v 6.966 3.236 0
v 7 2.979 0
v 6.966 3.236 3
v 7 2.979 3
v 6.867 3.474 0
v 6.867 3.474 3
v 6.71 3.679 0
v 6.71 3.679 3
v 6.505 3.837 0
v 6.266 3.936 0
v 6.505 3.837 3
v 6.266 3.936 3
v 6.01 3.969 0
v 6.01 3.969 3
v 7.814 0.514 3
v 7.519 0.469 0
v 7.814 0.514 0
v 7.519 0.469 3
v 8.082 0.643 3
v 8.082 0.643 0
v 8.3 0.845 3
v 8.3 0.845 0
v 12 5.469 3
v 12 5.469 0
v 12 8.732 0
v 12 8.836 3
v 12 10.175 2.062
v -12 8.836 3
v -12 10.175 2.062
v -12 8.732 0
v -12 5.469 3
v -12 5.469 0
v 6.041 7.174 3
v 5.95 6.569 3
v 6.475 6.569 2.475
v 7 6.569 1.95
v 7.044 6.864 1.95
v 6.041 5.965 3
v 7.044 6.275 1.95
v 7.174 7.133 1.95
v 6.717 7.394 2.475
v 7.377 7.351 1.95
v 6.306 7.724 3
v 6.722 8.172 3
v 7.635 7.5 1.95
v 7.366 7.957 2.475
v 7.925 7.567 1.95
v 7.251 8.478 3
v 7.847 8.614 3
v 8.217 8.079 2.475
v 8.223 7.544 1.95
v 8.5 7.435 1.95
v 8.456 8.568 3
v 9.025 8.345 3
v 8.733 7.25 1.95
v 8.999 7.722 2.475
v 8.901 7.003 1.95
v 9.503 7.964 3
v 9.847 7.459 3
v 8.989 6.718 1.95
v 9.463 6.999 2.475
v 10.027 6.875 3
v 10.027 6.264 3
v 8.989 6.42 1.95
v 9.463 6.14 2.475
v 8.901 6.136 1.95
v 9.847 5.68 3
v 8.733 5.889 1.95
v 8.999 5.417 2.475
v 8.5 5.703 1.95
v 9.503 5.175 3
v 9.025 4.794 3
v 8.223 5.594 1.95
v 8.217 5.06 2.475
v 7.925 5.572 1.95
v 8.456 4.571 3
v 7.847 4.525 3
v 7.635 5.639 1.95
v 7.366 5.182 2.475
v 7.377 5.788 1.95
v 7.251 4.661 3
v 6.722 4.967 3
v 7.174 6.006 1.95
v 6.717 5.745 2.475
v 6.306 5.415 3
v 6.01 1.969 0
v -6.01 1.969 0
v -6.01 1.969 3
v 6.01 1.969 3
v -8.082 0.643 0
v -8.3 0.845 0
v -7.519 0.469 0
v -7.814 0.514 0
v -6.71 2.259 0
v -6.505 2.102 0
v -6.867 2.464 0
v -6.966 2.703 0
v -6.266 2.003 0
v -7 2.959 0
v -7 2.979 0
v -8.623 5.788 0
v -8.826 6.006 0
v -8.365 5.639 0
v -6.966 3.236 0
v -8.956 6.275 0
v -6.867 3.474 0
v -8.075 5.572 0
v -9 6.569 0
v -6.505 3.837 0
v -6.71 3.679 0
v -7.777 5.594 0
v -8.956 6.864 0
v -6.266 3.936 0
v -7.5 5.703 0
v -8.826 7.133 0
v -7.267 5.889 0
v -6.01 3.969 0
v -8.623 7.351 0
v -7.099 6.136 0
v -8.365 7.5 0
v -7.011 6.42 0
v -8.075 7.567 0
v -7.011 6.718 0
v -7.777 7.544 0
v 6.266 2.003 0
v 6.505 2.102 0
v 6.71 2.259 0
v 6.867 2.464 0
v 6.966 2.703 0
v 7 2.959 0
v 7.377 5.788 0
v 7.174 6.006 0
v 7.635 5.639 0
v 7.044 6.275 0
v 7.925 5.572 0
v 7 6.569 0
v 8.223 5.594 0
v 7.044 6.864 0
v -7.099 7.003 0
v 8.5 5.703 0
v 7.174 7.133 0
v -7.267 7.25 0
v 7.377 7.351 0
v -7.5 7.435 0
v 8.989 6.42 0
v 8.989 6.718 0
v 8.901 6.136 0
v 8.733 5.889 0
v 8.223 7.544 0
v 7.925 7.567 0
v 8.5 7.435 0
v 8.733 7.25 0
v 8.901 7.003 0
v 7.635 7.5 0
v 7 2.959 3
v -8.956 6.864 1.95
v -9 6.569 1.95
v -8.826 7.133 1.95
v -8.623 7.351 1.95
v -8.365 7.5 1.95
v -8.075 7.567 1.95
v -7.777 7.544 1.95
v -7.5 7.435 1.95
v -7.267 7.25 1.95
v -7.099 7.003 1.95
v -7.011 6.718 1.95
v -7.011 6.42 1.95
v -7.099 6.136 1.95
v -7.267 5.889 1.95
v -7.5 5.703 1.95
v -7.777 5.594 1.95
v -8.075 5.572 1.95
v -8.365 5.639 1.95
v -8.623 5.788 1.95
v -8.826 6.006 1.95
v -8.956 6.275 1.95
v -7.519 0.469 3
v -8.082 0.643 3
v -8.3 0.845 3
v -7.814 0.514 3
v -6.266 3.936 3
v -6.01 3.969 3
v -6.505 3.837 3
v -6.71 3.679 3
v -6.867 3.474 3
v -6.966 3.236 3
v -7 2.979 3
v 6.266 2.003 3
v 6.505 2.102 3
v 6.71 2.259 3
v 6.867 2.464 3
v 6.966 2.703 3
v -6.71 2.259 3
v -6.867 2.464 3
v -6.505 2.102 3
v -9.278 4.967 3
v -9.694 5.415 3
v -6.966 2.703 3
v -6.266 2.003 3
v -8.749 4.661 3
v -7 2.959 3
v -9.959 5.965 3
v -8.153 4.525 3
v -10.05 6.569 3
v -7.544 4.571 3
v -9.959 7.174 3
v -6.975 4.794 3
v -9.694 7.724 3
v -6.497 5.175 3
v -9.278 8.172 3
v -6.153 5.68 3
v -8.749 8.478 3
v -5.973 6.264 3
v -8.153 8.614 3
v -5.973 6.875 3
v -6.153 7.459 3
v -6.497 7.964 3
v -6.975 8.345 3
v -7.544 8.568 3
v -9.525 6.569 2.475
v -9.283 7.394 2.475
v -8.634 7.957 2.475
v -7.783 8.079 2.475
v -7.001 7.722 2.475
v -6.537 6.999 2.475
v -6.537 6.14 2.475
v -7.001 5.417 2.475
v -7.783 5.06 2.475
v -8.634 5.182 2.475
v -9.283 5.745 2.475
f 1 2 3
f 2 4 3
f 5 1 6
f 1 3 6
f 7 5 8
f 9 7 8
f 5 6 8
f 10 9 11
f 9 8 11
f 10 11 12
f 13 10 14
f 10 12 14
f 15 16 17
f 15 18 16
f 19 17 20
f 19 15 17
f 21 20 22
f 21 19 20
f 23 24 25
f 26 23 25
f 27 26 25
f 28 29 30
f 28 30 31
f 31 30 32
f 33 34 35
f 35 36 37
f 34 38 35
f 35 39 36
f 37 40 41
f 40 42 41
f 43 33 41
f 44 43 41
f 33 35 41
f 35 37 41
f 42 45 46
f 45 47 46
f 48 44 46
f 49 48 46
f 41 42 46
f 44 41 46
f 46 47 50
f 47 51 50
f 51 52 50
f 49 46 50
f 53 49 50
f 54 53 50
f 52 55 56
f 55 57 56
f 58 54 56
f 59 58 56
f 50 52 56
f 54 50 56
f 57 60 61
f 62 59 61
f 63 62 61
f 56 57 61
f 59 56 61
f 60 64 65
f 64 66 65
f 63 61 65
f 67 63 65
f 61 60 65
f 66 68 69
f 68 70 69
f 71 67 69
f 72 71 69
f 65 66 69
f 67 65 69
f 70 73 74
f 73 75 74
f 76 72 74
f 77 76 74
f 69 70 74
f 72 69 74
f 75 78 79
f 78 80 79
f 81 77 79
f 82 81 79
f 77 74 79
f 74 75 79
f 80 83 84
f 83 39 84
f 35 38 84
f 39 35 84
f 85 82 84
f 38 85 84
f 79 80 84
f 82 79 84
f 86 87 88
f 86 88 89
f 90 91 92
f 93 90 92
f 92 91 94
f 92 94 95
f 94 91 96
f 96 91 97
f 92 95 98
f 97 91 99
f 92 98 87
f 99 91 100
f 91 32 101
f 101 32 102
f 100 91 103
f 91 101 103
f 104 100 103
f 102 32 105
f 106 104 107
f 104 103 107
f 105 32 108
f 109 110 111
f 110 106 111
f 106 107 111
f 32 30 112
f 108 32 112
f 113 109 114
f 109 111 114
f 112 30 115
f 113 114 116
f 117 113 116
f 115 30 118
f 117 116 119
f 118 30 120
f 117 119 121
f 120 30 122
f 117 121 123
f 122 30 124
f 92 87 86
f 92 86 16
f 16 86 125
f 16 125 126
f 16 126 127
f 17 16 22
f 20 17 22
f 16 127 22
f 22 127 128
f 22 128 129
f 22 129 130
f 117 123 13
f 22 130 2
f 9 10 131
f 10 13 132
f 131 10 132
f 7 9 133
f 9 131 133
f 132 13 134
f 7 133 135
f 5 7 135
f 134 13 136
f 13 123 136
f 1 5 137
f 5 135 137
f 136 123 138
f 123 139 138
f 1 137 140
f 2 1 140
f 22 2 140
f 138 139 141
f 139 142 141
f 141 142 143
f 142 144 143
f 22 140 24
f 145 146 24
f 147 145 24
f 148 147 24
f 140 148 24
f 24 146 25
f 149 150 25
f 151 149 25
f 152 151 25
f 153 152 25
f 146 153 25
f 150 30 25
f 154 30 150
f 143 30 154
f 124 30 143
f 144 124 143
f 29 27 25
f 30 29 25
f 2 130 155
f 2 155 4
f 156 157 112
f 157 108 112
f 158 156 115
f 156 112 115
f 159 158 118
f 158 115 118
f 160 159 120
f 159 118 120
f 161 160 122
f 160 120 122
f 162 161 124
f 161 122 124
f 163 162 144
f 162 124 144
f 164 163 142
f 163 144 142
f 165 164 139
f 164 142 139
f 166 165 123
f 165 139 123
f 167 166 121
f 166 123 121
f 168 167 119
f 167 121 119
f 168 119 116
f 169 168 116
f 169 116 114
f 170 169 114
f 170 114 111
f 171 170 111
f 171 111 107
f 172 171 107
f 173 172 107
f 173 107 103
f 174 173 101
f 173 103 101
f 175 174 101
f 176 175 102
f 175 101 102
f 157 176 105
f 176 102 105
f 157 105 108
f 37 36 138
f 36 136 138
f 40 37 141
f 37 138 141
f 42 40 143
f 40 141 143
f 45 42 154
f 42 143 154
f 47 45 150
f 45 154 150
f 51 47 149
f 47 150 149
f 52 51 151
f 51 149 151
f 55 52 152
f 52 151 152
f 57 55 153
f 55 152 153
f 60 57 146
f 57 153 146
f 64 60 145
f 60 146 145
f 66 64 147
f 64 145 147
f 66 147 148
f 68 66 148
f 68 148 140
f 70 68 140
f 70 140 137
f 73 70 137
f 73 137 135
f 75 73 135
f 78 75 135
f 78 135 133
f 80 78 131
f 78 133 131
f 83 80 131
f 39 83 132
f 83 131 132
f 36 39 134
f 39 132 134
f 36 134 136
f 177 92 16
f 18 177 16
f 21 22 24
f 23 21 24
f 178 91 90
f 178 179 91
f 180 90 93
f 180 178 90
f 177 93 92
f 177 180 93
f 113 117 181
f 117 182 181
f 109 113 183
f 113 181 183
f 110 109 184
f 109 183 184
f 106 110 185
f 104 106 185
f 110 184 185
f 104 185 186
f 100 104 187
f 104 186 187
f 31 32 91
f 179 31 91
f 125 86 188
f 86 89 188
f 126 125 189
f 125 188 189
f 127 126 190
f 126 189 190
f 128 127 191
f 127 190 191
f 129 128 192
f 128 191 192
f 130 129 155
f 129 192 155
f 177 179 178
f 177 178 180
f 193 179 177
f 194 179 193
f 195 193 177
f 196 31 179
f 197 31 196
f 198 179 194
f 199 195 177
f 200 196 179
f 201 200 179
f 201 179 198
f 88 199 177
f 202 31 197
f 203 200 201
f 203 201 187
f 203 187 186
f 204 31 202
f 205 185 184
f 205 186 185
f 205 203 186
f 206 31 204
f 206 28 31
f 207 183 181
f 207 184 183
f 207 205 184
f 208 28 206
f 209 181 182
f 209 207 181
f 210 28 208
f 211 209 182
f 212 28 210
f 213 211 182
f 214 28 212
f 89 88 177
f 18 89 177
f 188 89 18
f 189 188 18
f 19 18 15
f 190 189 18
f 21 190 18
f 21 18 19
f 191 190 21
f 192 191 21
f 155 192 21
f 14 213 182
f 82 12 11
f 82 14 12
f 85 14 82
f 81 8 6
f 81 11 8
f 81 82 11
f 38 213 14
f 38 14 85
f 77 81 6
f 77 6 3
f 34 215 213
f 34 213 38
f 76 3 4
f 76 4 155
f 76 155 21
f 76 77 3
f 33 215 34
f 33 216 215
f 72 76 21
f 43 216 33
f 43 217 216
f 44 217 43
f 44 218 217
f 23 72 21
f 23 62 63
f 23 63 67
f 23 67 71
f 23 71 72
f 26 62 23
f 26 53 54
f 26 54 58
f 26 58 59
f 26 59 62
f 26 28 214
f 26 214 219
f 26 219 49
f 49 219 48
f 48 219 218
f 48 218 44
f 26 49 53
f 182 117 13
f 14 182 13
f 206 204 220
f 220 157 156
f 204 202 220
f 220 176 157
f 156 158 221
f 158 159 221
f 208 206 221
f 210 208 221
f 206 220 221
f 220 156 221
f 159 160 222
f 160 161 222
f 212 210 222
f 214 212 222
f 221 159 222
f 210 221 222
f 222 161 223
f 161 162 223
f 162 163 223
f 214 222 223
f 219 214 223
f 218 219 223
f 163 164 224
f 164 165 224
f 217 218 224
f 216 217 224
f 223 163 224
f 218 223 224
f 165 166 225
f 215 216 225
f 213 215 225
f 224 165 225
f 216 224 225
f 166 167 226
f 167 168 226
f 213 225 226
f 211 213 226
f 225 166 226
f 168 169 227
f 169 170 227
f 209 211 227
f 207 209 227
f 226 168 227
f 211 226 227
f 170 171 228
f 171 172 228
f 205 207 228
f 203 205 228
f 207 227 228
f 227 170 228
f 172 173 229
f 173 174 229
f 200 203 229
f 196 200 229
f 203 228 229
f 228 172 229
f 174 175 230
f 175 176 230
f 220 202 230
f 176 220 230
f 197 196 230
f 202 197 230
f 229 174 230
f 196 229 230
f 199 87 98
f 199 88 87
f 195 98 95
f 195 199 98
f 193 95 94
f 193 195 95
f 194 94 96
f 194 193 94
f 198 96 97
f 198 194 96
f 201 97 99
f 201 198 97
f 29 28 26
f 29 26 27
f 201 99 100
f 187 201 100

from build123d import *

# Parameters (mm, degrees)
F0_W            = 14
F0_H            = 2
F1_DEPTH        = 3
F2_R            = 0.99
F4_DEPTH        = 25
F4_DEPTH_BACK   = 25
F5_R            = 1
F7_DEPTH        = 25
F7_DEPTH_BACK   = 25
F10_D           = 2
F10_DEPTH       = 4
F10_CSINK_D     = 4.1
F10_CSINK_ANGLE = 90
F10_TIP         = 0.600860619


with BuildPart() as f1:
    # F0 (on Top) → F1 (new body)
    with BuildSketch(Plane.XY):
        Polygon((8, 0.4693894553), (12, 5.4693894553), (12, 10.4693894553), (-12, 10.4693894553), (-12, 5.4693894553), (-8, 0.4693894553), align=None)
        with Locations((0, 2.9693894553)):
            Rectangle(F0_W, F0_H, mode=Mode.SUBTRACT)
    extrude(amount=F1_DEPTH)

    # F2
    f2_edges = [f1.edges().sort_by_distance(p)[0] for p in [
        (-7, 3.969389, 1.5),
        (-7, 1.969389, 1.5),
        (7, 3.969389, 1.5),
        (7, 1.969389, 1.5),
    ]]
    fillet(f2_edges, radius=F2_R)

    # F3 (on Right) → F4 (cut, two sides)
    with BuildSketch(Plane.YZ) as f4_sk:
        Polygon((10.9693894553, -0.8042101245), (10.9693894553, 3.1957898755), (8.1685593025, -0.8042101245), align=None)
    extrude(amount=-F4_DEPTH, mode=Mode.SUBTRACT)
    extrude(f4_sk.sketch, amount=F4_DEPTH_BACK, mode=Mode.SUBTRACT)

    # F5
    f5_edges = [f1.edges().sort_by_distance(p)[0] for p in [
        (8, 0.469389, 1.5),
        (-8, 0.469389, 1.5),
    ]]
    fillet(f5_edges, radius=F5_R)

    # F6 (on Right) → F7 (cut, two sides)
    with BuildSketch(Plane.YZ) as f7_sk:
        Polygon((12.1216029626, 3.5), (8.1216029626, 3.5), (12.1216029626, 0.6991698472), align=None)
    extrude(amount=F7_DEPTH, mode=Mode.SUBTRACT)
    extrude(f7_sk.sketch, amount=-F7_DEPTH_BACK, mode=Mode.SUBTRACT)

    # F10
    with Locations(Plane.XY.offset(3)):
        with Locations((-8, 6.5693894553), (8, 6.5693894553)):
            CounterSinkHole(F10_D / 2, F10_CSINK_D / 2, depth=F10_DEPTH, counter_sink_angle=F10_CSINK_ANGLE)
            with Locations((0, 0, -(F10_DEPTH + F10_TIP / 2))):  # 118° drill point
                Cone(0, F10_D / 2, F10_TIP, mode=Mode.SUBTRACT)


solid = f1.part
